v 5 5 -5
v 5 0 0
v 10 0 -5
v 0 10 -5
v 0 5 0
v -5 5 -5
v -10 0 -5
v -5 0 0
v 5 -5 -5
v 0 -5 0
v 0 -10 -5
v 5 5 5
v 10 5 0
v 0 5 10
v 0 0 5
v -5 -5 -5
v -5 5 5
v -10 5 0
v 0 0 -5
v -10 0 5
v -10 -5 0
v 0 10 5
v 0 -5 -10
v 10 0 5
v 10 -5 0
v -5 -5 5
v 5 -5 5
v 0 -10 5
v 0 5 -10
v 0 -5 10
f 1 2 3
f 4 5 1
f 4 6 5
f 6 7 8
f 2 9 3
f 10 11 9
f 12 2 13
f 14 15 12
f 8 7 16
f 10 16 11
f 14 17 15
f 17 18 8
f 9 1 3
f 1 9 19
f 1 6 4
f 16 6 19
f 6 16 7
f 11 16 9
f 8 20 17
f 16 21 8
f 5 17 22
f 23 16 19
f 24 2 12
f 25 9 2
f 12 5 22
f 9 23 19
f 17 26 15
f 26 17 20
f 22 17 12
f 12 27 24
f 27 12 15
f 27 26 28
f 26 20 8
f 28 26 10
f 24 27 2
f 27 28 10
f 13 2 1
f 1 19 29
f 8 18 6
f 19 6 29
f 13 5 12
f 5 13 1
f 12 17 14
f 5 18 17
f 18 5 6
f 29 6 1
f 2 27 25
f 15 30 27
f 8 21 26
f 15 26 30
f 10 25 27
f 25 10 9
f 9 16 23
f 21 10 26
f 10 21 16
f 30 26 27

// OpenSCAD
  
  cylinder(10,10,00,$fn=4, center=true);
  
  rotate ([0,180,0])
  cylinder(10,10,00,$fn=4, center=true);
  
  rotate ([90,0,0])
  cylinder(10,10,00,$fn=4, center=true);
  
  rotate ([270,0,0])
  cylinder(10,10,00,$fn=4, center=true);
